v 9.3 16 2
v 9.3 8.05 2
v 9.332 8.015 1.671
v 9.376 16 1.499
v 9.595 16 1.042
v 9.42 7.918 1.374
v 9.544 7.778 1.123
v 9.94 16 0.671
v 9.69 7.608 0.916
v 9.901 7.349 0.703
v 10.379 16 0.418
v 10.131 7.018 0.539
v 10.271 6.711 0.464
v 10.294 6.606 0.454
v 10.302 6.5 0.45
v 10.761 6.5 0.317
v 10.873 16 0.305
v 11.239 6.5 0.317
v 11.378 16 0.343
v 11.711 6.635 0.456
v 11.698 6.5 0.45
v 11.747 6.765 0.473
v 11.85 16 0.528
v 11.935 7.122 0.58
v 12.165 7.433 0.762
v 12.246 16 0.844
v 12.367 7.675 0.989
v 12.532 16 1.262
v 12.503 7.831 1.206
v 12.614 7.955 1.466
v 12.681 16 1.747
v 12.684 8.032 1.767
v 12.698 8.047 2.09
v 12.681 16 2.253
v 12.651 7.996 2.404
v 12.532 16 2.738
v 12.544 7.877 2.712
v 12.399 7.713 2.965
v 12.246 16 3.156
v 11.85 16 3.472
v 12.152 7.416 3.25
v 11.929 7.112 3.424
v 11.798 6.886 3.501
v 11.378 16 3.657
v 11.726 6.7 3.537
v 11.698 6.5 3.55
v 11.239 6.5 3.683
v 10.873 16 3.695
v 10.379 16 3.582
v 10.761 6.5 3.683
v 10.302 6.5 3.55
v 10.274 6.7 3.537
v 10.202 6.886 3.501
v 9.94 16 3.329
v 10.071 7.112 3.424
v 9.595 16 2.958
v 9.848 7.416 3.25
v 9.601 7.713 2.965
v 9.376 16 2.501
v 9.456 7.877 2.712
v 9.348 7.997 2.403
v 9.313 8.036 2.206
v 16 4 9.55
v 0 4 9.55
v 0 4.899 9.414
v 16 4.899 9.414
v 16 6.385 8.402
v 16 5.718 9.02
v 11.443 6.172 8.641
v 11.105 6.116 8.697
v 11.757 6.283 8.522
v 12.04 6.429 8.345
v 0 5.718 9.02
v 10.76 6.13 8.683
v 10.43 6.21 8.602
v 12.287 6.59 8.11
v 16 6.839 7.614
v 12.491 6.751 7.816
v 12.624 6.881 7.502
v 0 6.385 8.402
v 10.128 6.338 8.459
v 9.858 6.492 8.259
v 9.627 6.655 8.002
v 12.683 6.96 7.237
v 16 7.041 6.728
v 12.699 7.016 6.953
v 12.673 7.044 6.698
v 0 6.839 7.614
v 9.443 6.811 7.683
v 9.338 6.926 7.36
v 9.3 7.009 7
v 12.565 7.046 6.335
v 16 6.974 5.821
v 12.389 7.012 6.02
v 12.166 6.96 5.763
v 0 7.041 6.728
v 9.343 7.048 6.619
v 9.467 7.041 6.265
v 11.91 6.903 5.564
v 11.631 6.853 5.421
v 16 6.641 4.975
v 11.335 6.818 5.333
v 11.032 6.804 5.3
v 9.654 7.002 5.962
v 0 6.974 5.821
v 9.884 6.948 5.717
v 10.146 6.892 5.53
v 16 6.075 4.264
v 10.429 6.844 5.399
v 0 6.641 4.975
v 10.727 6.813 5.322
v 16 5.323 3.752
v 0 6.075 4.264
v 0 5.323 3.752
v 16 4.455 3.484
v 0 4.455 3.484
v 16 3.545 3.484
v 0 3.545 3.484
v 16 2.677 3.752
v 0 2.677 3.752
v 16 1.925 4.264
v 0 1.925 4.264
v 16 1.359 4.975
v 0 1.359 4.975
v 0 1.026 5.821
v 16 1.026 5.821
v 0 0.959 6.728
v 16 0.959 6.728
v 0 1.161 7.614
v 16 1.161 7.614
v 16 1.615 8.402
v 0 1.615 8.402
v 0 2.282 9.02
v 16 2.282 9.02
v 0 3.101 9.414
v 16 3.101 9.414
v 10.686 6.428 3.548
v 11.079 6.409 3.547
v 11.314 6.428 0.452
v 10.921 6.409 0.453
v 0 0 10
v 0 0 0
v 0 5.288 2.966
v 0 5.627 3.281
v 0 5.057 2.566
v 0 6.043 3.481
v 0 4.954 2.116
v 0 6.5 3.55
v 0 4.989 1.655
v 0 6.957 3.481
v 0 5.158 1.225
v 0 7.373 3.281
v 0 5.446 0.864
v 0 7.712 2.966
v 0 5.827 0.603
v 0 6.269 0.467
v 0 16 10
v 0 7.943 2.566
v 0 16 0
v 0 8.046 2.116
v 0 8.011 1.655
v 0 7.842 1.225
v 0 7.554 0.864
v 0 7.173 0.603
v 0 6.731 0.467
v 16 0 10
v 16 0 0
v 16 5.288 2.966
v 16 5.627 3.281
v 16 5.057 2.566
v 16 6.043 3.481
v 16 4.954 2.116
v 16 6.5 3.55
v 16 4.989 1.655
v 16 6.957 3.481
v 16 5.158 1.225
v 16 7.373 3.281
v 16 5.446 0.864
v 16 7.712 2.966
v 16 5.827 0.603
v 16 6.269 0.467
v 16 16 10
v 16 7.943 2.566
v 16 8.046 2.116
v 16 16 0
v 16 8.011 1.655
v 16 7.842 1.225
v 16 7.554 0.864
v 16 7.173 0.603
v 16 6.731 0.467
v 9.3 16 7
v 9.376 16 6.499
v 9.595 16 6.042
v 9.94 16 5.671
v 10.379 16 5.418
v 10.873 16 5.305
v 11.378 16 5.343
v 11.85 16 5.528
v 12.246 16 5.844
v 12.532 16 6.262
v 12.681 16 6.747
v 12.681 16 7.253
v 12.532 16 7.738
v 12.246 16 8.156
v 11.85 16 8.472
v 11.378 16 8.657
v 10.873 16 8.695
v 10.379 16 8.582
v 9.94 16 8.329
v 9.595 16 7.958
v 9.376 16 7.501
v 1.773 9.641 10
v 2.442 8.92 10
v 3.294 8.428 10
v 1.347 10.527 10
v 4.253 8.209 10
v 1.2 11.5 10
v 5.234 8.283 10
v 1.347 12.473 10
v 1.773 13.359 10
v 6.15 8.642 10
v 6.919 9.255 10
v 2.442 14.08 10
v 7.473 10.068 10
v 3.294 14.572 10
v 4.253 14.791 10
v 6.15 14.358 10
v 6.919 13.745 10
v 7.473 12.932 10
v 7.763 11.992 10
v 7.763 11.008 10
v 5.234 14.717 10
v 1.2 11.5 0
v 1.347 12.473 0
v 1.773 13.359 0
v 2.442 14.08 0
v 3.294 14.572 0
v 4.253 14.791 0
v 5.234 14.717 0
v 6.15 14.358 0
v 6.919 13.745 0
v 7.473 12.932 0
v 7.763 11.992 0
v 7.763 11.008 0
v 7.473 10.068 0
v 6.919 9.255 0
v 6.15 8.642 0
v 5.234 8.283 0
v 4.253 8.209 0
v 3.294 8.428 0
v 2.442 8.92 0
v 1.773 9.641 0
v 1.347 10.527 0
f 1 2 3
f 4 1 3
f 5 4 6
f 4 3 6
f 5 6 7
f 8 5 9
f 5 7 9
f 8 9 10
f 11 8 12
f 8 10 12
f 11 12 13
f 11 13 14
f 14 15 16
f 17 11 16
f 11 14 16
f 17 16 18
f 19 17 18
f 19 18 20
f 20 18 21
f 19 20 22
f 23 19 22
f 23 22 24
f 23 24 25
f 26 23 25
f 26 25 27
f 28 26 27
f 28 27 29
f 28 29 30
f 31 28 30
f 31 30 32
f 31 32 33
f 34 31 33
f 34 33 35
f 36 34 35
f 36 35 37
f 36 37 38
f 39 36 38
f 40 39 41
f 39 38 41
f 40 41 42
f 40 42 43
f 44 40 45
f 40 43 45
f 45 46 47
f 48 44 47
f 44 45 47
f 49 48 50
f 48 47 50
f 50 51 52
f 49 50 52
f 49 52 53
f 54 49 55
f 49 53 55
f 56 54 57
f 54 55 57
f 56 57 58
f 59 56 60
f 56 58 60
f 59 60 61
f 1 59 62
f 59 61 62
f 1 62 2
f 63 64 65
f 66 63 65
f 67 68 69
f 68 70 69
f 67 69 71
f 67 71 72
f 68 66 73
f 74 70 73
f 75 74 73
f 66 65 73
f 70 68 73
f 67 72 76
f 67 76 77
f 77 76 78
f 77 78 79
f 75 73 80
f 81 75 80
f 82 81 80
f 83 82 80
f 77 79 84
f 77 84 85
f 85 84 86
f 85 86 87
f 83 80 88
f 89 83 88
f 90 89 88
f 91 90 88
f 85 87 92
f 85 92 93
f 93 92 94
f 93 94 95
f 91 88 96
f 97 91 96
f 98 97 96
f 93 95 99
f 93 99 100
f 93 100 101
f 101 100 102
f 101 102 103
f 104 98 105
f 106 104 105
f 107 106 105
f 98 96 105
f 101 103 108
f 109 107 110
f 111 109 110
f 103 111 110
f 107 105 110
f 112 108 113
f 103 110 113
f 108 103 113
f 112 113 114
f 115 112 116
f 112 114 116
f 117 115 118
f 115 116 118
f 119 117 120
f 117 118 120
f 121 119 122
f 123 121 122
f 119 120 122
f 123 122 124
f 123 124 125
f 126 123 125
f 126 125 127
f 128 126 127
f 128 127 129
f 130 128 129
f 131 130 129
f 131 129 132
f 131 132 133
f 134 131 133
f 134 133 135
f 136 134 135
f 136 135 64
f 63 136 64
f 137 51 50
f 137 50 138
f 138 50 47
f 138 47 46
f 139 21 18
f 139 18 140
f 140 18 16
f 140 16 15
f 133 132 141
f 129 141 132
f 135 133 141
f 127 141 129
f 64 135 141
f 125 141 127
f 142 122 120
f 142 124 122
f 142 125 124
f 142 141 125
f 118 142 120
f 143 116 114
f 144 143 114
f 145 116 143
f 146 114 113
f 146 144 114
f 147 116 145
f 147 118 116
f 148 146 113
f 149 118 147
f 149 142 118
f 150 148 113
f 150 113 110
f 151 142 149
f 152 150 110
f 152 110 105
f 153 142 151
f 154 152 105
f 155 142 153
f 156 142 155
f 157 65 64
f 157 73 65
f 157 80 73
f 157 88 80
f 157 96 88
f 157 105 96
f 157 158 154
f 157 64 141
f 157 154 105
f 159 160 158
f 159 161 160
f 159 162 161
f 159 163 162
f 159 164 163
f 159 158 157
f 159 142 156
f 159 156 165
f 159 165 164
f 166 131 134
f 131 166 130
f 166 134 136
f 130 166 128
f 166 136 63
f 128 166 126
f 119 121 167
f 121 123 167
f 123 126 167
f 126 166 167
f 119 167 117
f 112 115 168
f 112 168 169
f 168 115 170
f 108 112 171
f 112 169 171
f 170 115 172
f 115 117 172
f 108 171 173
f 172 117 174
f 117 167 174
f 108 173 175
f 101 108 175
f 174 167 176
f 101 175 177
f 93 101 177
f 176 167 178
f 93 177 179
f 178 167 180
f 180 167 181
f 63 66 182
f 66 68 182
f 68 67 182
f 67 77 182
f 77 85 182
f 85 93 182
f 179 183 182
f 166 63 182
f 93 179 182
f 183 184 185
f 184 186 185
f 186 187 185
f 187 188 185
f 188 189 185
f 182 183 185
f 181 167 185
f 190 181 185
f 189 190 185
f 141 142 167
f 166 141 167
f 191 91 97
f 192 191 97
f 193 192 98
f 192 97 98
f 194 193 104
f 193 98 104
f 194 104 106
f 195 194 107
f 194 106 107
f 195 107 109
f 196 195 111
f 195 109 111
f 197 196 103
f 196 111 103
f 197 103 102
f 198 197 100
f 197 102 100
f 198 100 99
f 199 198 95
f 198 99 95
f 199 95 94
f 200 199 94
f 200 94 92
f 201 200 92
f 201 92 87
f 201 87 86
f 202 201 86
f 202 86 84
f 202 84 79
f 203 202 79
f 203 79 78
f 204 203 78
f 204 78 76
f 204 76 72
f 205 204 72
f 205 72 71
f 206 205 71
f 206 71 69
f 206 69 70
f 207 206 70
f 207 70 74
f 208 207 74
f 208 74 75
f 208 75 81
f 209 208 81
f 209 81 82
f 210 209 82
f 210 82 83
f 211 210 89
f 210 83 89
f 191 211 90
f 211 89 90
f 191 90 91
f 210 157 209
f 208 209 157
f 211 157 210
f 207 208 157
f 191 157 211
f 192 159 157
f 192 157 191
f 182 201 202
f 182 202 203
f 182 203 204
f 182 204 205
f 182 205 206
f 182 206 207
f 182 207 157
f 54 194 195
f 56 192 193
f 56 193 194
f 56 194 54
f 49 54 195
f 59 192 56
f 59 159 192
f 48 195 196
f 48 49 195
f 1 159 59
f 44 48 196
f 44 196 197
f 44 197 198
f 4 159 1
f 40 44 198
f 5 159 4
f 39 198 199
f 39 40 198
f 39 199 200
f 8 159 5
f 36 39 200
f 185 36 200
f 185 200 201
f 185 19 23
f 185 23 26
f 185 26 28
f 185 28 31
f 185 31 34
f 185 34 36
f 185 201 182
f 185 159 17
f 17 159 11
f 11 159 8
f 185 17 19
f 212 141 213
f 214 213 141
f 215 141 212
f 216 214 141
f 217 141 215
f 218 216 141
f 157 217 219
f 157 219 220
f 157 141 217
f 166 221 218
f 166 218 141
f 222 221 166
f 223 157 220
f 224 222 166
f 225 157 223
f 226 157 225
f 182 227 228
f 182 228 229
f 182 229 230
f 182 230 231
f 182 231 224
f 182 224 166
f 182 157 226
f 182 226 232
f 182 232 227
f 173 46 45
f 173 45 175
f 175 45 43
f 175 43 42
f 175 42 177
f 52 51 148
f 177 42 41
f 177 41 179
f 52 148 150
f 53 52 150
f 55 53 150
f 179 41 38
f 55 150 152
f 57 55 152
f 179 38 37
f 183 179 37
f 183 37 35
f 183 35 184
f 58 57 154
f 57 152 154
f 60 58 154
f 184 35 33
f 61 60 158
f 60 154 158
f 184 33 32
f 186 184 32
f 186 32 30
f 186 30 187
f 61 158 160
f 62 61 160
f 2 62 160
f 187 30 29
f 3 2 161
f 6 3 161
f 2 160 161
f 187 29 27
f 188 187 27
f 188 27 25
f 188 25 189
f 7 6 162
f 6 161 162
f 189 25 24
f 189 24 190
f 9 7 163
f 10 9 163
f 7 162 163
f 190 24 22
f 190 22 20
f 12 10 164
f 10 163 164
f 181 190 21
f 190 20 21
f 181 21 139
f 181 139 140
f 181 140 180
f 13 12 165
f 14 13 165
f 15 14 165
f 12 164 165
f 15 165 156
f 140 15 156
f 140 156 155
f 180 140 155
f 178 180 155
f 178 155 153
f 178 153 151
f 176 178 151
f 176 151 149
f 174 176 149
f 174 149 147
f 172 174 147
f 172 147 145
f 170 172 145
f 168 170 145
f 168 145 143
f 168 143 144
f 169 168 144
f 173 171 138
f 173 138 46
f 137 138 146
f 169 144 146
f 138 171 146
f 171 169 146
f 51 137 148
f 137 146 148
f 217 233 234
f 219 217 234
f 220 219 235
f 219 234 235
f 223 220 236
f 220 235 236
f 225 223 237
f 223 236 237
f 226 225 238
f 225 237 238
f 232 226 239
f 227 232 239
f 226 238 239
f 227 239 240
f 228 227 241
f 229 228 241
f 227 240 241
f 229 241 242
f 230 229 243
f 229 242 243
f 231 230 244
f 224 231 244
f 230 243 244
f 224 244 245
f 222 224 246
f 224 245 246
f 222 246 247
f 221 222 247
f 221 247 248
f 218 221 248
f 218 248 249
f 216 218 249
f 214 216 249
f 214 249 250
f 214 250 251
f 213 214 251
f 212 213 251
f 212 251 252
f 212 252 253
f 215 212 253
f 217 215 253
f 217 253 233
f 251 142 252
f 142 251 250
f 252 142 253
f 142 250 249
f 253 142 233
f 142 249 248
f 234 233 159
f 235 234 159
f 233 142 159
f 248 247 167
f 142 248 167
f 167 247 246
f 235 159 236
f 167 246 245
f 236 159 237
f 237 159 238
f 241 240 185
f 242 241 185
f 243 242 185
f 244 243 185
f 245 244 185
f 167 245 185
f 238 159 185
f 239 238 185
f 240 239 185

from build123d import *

# Parameters (mm, degrees)
ESQUISSE1_W                     = 16
ESQUISSE1_H                     = 16
BOSS_EXTRU_1_DEPTH              = 10
D_GAGEMENT_M61_D                = 6.6
DIAM_TRE_DU_PER_AGE_6_1_6_1_1_D = 6.1
DIAM_TRE_DU_PER_AGE_3_1_3_1_1_D = 3.1
D_GAGEMENT_M31_D                = 3.4
D_GAGEMENT_M31_DEPTH            = 11
D_GAGEMENT_M31_TIP              = 1.021463052
D_GAGEMENT_M33_D                = 3.4
D_GAGEMENT_M33_DEPTH            = 9.5
D_GAGEMENT_M33_TIP              = 1.021463052


with BuildPart() as part:
    # Esquisse1 → Boss.-Extru.1 (new body)
    with BuildSketch(Plane.XY):
        with Locations((8, 8)):
            Rectangle(ESQUISSE1_W, ESQUISSE1_H)
    extrude(amount=BOSS_EXTRU_1_DEPTH)

    # Dégagement M61 (through all)
    with Locations(Plane.XY.offset(10)):
        with Locations((4.5, 11.5)):
            Hole(D_GAGEMENT_M61_D / 2)

    # Diamètre du perçage Ø6.1 (6.1)1 (through all)
    with Locations(Plane(origin=(16, 0, 0), x_dir=(0, 0, -1), z_dir=(1, 0, 0))):
        with Locations((-6.5, 4)):
            Hole(DIAM_TRE_DU_PER_AGE_6_1_6_1_1_D / 2)

    # Diamètre du perçage Ø3.1 (3.1)1 (through all)
    with Locations(Plane(origin=(16, 0, 0), x_dir=(0, 0, -1), z_dir=(1, 0, 0))):
        with Locations((-2, 6.5)):
            Hole(DIAM_TRE_DU_PER_AGE_3_1_3_1_1_D / 2)

    # Dégagement M31
    with Locations(Plane(origin=(0, 16, 0), x_dir=(1, 0, 0), z_dir=(0, 1, 0))):
        with Locations((11, -7)):
            Hole(D_GAGEMENT_M31_D / 2, depth=D_GAGEMENT_M31_DEPTH)
            with Locations((0, 0, -(D_GAGEMENT_M31_DEPTH + D_GAGEMENT_M31_TIP / 2))):  # 118° drill point
                Cone(0, D_GAGEMENT_M31_D / 2, D_GAGEMENT_M31_TIP, mode=Mode.SUBTRACT)

    # Dégagement M33
    with Locations(Plane(origin=(0, 16, 0), x_dir=(1, 0, 0), z_dir=(0, 1, 0))):
        with Locations((11, -2)):
            Hole(D_GAGEMENT_M33_D / 2, depth=D_GAGEMENT_M33_DEPTH)
            with Locations((0, 0, -(D_GAGEMENT_M33_DEPTH + D_GAGEMENT_M33_TIP / 2))):  # 118° drill point
                Cone(0, D_GAGEMENT_M33_D / 2, D_GAGEMENT_M33_TIP, mode=Mode.SUBTRACT)


solid = part.part
